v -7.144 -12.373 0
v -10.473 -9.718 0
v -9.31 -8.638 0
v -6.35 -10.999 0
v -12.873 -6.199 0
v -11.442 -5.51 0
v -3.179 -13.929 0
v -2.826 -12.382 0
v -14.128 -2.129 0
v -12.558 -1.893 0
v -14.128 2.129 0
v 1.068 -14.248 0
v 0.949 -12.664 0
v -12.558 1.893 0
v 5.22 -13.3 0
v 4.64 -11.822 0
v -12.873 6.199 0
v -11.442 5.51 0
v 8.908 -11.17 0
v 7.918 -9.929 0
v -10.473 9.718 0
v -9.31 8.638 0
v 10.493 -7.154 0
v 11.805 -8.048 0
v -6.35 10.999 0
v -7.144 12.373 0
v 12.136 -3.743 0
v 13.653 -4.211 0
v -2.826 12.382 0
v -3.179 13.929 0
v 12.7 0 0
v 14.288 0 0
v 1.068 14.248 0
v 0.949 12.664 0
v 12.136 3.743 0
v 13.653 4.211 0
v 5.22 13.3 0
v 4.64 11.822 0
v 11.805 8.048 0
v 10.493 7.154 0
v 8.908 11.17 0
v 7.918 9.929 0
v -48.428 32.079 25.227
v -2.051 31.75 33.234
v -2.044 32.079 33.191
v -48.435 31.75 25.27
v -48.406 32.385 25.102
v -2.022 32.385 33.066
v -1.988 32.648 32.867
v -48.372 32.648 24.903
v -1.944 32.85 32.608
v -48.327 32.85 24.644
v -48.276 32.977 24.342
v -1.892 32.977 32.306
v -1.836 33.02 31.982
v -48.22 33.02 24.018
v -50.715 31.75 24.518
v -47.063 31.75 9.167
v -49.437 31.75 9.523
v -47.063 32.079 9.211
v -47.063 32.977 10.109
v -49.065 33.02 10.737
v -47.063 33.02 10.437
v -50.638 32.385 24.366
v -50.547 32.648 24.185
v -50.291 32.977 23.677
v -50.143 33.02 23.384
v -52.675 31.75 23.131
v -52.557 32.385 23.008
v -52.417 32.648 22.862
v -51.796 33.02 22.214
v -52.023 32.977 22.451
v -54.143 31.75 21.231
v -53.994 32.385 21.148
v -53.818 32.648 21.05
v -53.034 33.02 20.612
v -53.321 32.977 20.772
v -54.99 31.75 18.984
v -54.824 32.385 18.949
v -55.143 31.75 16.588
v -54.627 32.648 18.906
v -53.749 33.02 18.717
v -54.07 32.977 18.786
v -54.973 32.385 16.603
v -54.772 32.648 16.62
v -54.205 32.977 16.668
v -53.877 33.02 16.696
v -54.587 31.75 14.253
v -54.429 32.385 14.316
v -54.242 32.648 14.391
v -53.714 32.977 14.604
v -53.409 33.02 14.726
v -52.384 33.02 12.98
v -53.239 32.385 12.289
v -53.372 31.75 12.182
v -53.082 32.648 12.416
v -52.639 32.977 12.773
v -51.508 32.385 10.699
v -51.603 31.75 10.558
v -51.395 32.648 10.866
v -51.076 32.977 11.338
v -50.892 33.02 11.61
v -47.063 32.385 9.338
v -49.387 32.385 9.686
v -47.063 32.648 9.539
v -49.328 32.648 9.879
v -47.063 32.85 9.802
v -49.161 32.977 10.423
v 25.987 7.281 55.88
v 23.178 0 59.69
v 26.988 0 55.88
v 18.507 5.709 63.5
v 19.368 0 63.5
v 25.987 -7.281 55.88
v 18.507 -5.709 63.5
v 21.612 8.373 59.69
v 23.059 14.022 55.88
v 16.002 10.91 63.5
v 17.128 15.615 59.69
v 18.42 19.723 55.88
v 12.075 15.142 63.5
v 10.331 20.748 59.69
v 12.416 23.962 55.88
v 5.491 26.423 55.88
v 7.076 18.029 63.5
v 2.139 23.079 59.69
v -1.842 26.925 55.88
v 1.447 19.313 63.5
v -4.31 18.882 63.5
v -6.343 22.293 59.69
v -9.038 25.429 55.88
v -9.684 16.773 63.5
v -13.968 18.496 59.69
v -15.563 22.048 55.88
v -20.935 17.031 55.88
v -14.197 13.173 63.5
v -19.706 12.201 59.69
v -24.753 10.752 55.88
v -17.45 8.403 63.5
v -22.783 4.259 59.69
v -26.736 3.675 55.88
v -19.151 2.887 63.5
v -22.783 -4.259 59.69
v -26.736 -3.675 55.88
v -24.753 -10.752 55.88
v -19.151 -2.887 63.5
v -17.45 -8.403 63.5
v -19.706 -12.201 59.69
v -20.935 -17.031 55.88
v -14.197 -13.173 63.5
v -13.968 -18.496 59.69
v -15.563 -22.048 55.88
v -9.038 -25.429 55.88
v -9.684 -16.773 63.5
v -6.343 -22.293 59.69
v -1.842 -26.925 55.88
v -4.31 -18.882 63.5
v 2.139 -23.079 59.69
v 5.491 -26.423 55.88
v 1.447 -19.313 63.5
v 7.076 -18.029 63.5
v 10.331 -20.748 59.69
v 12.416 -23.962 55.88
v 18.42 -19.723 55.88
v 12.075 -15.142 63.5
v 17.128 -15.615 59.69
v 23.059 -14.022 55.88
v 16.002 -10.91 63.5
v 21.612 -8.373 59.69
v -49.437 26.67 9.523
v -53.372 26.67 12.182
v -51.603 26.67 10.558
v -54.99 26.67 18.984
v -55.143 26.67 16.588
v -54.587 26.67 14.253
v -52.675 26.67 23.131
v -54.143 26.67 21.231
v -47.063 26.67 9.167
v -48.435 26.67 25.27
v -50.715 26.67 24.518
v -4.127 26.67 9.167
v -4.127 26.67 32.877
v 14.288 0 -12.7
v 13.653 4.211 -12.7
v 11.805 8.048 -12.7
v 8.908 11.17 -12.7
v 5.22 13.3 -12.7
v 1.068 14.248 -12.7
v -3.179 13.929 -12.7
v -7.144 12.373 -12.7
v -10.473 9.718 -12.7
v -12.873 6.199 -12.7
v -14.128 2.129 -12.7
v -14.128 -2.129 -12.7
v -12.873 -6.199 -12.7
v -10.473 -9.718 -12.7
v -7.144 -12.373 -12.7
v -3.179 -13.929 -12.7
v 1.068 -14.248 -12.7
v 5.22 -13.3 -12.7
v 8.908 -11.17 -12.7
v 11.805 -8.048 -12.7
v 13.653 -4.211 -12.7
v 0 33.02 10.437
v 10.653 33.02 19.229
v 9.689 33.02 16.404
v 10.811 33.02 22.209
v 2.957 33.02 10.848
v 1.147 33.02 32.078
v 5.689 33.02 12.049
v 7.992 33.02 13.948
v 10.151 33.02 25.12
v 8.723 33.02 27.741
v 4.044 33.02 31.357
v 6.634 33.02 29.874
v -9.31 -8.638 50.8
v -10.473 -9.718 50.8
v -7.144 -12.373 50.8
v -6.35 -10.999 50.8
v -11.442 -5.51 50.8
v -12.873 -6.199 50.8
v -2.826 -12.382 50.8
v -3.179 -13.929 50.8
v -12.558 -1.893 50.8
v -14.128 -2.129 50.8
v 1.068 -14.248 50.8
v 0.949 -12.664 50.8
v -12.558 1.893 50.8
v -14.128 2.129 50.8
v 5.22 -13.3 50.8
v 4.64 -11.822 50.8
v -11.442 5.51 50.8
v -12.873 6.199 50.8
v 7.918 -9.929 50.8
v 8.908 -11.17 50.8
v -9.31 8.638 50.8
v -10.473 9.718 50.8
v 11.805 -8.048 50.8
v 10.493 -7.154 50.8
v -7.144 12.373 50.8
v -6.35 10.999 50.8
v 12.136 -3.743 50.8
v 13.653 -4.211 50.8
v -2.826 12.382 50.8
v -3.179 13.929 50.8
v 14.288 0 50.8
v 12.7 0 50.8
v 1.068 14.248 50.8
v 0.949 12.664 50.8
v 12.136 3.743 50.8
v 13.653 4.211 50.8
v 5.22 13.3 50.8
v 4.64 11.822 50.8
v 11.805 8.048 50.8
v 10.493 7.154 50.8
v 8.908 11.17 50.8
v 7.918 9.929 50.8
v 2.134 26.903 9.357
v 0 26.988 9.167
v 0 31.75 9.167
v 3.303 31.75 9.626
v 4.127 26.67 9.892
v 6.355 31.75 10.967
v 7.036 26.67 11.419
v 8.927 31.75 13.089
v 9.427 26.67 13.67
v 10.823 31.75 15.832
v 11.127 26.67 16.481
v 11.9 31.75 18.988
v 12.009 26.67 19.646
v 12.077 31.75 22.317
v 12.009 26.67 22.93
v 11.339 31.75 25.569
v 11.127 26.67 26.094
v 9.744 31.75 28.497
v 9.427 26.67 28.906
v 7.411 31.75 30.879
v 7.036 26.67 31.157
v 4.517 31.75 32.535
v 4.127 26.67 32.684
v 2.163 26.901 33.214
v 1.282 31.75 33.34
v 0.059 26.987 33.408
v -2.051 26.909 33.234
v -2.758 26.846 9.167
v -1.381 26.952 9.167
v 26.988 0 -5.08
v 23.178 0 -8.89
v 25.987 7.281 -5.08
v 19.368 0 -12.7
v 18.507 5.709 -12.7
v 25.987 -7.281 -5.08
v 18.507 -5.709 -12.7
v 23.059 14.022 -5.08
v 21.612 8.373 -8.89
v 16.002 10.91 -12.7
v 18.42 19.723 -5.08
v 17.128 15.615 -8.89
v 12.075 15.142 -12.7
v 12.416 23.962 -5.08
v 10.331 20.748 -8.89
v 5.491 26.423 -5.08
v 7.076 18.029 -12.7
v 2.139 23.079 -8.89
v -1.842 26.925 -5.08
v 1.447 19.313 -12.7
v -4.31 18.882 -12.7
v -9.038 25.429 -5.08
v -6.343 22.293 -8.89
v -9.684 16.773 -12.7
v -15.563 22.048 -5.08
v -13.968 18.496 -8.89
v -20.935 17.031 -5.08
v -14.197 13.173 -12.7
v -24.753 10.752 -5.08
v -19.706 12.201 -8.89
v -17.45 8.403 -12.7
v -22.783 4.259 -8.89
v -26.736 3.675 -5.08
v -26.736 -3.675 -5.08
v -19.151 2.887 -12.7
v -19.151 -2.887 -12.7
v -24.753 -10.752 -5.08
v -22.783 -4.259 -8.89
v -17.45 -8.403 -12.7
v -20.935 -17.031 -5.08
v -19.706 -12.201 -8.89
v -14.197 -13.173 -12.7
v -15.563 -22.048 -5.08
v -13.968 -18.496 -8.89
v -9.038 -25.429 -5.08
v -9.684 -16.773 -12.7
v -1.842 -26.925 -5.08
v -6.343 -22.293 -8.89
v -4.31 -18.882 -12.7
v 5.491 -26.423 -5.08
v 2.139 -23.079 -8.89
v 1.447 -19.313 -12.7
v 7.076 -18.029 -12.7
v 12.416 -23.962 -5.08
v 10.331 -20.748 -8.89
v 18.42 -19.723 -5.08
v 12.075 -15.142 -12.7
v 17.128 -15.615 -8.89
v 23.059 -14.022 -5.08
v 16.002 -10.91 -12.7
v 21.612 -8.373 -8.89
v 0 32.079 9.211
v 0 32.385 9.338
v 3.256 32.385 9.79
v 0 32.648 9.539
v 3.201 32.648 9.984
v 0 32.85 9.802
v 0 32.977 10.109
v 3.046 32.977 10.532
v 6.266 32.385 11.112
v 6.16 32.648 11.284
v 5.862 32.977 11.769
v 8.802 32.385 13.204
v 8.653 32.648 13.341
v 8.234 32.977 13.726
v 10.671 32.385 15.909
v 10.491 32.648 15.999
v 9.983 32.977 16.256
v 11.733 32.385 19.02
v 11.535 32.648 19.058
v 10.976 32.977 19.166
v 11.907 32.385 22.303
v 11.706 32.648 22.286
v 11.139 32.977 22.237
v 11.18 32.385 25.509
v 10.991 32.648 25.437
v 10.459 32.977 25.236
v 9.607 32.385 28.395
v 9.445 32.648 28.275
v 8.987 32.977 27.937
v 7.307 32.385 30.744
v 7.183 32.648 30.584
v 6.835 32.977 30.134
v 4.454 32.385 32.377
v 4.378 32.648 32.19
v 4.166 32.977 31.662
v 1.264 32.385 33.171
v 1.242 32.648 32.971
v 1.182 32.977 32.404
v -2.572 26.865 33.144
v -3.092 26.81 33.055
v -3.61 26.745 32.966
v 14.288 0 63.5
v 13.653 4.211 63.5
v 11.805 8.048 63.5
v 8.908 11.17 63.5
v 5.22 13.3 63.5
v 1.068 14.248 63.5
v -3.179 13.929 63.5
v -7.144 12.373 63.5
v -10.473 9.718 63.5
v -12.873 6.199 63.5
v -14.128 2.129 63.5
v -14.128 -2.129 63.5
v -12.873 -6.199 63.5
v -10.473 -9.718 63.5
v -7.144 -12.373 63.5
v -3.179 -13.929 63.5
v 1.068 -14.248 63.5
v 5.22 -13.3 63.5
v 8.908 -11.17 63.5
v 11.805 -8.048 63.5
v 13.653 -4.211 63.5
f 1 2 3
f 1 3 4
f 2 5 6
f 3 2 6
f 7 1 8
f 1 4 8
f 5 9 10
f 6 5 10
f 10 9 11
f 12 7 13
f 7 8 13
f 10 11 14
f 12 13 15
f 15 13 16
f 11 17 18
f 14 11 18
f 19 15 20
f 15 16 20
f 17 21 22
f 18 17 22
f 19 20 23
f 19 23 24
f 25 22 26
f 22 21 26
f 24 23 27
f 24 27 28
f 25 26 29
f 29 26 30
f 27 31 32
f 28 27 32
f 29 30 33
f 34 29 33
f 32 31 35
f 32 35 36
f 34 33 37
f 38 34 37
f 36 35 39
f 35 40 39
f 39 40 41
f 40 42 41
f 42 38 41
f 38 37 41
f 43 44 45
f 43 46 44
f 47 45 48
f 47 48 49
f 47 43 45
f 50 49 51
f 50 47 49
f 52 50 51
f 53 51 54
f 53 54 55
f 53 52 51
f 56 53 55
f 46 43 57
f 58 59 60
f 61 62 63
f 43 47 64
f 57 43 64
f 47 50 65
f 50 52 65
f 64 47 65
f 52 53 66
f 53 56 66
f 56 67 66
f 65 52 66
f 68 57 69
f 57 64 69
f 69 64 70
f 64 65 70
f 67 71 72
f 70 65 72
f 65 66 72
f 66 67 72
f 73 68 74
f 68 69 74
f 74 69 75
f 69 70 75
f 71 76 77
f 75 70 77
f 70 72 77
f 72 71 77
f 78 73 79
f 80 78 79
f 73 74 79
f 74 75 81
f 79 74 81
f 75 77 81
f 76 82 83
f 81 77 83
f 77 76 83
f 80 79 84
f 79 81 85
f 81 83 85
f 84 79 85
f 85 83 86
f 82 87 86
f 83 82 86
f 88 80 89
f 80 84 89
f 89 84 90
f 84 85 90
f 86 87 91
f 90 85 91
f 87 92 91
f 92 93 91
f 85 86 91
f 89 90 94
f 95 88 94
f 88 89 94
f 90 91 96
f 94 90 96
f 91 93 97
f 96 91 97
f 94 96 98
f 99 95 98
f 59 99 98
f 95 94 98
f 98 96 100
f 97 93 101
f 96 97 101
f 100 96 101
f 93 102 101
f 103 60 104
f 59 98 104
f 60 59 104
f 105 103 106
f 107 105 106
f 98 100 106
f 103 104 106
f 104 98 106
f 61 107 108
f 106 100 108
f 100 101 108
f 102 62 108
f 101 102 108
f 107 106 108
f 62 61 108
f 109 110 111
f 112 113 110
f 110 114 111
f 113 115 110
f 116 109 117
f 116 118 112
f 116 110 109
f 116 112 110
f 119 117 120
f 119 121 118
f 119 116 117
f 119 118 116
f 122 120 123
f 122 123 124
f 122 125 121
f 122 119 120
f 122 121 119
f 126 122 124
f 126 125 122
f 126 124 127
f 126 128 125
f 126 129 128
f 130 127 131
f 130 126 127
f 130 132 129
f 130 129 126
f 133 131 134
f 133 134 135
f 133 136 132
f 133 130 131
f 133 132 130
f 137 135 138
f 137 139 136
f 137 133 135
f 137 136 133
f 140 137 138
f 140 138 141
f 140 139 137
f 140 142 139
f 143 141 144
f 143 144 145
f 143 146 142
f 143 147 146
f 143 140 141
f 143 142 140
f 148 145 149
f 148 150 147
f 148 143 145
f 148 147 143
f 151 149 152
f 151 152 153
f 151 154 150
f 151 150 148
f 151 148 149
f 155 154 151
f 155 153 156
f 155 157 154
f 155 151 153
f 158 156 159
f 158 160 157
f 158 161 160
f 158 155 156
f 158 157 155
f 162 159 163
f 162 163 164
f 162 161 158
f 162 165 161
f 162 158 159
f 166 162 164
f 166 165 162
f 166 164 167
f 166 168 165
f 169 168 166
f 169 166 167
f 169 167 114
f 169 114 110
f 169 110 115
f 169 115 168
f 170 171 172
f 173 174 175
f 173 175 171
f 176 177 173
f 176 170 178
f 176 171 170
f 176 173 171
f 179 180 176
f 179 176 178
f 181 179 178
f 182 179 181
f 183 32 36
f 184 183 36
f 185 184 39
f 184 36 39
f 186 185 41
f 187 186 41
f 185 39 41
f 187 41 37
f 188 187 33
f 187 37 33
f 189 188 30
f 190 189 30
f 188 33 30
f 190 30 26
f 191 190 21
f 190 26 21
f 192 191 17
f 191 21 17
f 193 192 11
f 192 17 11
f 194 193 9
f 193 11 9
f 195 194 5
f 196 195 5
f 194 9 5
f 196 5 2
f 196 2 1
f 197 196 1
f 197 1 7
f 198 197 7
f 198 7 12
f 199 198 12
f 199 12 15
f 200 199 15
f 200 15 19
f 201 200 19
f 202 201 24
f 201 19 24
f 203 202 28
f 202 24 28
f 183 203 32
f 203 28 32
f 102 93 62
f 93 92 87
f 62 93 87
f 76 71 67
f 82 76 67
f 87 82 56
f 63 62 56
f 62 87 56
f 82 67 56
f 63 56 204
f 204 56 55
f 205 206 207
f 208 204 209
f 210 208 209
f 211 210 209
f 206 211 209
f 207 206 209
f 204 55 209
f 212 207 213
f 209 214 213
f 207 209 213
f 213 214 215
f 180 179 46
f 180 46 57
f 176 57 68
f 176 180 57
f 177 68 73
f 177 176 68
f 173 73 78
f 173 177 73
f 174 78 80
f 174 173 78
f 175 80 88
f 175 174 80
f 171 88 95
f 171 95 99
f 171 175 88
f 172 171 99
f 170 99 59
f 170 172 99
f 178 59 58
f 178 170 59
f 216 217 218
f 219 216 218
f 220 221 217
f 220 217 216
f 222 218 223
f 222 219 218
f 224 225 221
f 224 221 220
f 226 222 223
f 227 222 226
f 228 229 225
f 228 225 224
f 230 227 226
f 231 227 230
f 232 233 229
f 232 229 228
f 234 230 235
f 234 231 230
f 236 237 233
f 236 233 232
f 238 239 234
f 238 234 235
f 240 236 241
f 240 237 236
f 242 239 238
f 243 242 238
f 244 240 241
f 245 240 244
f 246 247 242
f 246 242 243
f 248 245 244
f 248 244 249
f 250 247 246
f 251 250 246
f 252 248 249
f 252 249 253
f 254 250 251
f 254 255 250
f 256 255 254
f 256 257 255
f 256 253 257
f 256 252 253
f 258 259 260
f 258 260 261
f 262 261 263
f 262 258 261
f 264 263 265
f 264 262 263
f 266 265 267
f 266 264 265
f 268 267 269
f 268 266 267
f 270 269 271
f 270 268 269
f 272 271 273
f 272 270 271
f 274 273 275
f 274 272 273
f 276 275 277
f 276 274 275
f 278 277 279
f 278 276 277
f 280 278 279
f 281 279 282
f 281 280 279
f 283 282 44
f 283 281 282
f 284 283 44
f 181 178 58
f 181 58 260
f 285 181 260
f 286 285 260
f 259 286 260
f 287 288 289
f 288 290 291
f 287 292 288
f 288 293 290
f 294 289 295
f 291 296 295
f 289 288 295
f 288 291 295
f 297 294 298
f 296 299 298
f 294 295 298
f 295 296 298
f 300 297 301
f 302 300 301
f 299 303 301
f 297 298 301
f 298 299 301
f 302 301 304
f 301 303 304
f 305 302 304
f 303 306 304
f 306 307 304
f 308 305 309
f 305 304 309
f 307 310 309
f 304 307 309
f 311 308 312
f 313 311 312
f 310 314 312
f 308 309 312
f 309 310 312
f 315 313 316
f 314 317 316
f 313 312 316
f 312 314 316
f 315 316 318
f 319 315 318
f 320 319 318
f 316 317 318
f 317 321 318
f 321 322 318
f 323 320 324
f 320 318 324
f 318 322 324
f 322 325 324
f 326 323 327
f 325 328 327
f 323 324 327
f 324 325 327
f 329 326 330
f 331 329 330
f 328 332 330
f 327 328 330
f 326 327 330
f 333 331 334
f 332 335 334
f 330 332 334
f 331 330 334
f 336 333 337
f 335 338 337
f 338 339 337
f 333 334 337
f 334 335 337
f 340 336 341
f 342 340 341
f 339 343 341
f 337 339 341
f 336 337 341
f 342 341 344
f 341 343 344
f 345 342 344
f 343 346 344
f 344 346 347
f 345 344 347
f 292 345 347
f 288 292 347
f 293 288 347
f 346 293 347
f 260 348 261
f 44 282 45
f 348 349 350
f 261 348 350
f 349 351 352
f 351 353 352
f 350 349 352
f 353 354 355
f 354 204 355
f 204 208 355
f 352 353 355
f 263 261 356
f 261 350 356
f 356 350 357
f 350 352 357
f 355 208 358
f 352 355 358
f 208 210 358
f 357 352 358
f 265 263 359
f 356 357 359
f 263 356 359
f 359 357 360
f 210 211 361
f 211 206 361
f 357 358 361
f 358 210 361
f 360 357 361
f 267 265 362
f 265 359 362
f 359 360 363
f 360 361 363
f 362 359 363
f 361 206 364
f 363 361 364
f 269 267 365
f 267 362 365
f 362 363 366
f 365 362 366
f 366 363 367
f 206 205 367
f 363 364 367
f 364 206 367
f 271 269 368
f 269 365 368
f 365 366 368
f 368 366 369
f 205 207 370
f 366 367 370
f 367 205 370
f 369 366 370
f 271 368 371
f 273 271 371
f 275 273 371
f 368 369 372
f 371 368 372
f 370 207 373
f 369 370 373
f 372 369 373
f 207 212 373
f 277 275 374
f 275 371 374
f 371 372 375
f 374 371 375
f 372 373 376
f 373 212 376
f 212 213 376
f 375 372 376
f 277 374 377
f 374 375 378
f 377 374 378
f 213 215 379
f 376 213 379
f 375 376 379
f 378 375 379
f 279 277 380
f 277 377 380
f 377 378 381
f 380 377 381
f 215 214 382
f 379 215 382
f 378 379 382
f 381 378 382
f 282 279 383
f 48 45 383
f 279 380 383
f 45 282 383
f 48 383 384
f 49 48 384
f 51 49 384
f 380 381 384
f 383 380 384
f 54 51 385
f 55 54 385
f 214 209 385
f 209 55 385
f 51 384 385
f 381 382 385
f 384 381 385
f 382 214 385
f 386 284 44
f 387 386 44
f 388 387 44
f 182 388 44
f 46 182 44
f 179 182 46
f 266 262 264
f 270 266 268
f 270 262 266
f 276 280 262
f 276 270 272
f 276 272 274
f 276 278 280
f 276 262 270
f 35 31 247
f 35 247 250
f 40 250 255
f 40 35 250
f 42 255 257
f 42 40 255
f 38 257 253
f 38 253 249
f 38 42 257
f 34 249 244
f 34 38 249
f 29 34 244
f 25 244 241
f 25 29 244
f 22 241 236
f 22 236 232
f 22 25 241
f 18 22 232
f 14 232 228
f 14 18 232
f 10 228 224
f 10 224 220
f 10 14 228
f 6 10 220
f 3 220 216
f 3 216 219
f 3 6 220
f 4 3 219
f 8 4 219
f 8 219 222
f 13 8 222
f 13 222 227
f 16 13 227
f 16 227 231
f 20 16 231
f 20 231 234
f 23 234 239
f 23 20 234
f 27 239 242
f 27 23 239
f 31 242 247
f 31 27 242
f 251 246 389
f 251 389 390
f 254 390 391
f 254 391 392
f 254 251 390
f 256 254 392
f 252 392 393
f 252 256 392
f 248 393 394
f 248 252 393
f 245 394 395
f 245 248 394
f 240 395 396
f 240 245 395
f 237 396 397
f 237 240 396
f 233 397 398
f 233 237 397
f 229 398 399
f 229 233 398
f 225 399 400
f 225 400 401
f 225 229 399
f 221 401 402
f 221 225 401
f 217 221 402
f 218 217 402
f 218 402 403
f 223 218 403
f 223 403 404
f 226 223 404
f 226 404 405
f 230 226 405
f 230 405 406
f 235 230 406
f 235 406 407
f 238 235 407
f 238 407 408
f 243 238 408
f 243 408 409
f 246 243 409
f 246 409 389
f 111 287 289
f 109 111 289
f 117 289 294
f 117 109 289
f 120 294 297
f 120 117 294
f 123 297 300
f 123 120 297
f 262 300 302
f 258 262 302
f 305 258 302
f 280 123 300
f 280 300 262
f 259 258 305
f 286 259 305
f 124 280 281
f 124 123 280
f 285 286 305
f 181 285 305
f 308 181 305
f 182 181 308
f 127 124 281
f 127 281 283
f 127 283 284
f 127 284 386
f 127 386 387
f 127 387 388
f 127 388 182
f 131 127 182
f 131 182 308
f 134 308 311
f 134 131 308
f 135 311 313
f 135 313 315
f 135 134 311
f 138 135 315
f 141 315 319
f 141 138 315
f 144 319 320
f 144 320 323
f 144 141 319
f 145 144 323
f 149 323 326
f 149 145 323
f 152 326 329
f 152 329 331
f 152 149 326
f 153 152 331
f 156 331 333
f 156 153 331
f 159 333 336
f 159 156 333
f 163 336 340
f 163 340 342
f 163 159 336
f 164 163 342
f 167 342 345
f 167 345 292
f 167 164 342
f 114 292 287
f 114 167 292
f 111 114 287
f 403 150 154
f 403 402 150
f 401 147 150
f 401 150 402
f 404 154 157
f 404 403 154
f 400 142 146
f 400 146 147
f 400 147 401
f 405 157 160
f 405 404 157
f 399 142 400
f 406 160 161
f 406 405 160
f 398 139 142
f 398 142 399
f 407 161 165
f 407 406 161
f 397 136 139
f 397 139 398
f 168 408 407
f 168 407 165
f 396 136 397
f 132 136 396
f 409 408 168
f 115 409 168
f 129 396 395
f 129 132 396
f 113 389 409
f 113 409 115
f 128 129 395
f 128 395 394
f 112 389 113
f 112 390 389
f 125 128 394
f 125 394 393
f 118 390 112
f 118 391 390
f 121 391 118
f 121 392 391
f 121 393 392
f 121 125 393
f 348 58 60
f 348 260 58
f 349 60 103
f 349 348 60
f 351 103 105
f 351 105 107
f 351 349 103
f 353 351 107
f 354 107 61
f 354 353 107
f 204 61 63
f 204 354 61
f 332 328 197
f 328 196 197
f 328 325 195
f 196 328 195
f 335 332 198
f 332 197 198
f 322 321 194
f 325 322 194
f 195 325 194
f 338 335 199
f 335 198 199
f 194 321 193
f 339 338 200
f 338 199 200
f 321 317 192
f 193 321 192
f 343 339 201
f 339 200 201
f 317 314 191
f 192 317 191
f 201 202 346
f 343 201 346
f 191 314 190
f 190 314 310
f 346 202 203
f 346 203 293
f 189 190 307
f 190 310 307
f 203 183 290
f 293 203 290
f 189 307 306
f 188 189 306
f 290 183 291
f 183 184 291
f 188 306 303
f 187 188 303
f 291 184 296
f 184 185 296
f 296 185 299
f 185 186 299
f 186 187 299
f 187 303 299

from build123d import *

# Parameters (mm, degrees)
F0_R          = 14.2875
F0_R_2        = 12.7
F2_DEPTH      = 50.8
F3_R          = 26.9875
F3_R_2        = 14.2875
F4_DEPTH      = 63.5
F4_DEPTH_BACK = 12.7
F5_SIZE       = 7.62
F7_START      = -26.67
F7_DEPTH      = 6.35
F8_R          = 1.27


with BuildPart() as f2:
    # F0 (on Top) → F2 (new body)
    with BuildSketch(Plane.XY):
        Circle(F0_R)
        Circle(F0_R_2, mode=Mode.SUBTRACT)
    extrude(amount=F2_DEPTH)

    # F3 (on face) → F4 (join, two sides)
    with BuildSketch(Plane.XY) as f4_sk:
        Circle(F3_R)
        Circle(F3_R_2, mode=Mode.SUBTRACT)
    extrude(amount=F4_DEPTH)
    extrude(f4_sk.sketch, amount=-F4_DEPTH_BACK)

    # F5
    f5_edges = [f2.edges().sort_by_distance(p)[0] for p in [
        (-26.9875, 0, 63.5),
        (-26.9875, 0, -12.7),
    ]]
    chamfer(f5_edges, length=F5_SIZE)

    # F6 (on Front) → F7 (join)
    with BuildSketch(Plane.XZ.offset(F7_START)):
        with BuildLine():
            ThreePointArc((0, 9.1674418672), (8.5704498555, 12.717438433), (12.1204464213, 21.2878882885))
            ThreePointArc((12.1204464213, 21.2878882885), (7.8117209816, 30.5551552404), (-2.0510178584, 33.233538007))
            ThreePointArc((-2.0510178584, 33.233538007), (-12.0766681836, 20.2586618626), (0, 9.1674418672))
        make_face()
        with BuildLine():
            ThreePointArc((0, 9.1674418672), (-12.0766681836, 20.2586618626), (-2.0510178584, 33.233538007))
            Line((-2.0510178584, 33.233538007), (-48.4348551439, 25.2696280601))
            ThreePointArc((-48.4348551439, 25.2696280601), (-41.8358763876, 23.4775709789), (-38.9529867456, 17.2770116073))
            ThreePointArc((-38.9529867456, 17.2770116073), (-41.32822473, 11.5426798516), (-47.0625564857, 9.1674418672))
            Line((-47.0625564857, 9.1674418672), (0, 9.1674418672))
        make_face()
        with BuildLine():
            ThreePointArc((-38.9529867456, 17.2770116073), (-41.8358763876, 23.4775709789), (-48.4348551439, 25.2696280601))
            ThreePointArc((-48.4348551439, 25.2696280601), (-55.142835005, 16.5883749689), (-47.0625564857, 9.1674418672))
            ThreePointArc((-47.0625564857, 9.1674418672), (-41.32822473, 11.5426798516), (-38.9529867456, 17.2770116073))
        make_face()
    extrude(amount=-F7_DEPTH)

    # F8
    f8_edges = [f2.edges().sort_by_distance(p)[0] for p in [
        (12.076668, 33.02, 22.317115),
        (-25.242937, 33.02, 29.251583),
        (-55.142835, 33.02, 16.588375),
        (-23.531278, 33.02, 9.167442),
    ]]
    fillet(f8_edges, radius=F8_R)


solid = f2.part
